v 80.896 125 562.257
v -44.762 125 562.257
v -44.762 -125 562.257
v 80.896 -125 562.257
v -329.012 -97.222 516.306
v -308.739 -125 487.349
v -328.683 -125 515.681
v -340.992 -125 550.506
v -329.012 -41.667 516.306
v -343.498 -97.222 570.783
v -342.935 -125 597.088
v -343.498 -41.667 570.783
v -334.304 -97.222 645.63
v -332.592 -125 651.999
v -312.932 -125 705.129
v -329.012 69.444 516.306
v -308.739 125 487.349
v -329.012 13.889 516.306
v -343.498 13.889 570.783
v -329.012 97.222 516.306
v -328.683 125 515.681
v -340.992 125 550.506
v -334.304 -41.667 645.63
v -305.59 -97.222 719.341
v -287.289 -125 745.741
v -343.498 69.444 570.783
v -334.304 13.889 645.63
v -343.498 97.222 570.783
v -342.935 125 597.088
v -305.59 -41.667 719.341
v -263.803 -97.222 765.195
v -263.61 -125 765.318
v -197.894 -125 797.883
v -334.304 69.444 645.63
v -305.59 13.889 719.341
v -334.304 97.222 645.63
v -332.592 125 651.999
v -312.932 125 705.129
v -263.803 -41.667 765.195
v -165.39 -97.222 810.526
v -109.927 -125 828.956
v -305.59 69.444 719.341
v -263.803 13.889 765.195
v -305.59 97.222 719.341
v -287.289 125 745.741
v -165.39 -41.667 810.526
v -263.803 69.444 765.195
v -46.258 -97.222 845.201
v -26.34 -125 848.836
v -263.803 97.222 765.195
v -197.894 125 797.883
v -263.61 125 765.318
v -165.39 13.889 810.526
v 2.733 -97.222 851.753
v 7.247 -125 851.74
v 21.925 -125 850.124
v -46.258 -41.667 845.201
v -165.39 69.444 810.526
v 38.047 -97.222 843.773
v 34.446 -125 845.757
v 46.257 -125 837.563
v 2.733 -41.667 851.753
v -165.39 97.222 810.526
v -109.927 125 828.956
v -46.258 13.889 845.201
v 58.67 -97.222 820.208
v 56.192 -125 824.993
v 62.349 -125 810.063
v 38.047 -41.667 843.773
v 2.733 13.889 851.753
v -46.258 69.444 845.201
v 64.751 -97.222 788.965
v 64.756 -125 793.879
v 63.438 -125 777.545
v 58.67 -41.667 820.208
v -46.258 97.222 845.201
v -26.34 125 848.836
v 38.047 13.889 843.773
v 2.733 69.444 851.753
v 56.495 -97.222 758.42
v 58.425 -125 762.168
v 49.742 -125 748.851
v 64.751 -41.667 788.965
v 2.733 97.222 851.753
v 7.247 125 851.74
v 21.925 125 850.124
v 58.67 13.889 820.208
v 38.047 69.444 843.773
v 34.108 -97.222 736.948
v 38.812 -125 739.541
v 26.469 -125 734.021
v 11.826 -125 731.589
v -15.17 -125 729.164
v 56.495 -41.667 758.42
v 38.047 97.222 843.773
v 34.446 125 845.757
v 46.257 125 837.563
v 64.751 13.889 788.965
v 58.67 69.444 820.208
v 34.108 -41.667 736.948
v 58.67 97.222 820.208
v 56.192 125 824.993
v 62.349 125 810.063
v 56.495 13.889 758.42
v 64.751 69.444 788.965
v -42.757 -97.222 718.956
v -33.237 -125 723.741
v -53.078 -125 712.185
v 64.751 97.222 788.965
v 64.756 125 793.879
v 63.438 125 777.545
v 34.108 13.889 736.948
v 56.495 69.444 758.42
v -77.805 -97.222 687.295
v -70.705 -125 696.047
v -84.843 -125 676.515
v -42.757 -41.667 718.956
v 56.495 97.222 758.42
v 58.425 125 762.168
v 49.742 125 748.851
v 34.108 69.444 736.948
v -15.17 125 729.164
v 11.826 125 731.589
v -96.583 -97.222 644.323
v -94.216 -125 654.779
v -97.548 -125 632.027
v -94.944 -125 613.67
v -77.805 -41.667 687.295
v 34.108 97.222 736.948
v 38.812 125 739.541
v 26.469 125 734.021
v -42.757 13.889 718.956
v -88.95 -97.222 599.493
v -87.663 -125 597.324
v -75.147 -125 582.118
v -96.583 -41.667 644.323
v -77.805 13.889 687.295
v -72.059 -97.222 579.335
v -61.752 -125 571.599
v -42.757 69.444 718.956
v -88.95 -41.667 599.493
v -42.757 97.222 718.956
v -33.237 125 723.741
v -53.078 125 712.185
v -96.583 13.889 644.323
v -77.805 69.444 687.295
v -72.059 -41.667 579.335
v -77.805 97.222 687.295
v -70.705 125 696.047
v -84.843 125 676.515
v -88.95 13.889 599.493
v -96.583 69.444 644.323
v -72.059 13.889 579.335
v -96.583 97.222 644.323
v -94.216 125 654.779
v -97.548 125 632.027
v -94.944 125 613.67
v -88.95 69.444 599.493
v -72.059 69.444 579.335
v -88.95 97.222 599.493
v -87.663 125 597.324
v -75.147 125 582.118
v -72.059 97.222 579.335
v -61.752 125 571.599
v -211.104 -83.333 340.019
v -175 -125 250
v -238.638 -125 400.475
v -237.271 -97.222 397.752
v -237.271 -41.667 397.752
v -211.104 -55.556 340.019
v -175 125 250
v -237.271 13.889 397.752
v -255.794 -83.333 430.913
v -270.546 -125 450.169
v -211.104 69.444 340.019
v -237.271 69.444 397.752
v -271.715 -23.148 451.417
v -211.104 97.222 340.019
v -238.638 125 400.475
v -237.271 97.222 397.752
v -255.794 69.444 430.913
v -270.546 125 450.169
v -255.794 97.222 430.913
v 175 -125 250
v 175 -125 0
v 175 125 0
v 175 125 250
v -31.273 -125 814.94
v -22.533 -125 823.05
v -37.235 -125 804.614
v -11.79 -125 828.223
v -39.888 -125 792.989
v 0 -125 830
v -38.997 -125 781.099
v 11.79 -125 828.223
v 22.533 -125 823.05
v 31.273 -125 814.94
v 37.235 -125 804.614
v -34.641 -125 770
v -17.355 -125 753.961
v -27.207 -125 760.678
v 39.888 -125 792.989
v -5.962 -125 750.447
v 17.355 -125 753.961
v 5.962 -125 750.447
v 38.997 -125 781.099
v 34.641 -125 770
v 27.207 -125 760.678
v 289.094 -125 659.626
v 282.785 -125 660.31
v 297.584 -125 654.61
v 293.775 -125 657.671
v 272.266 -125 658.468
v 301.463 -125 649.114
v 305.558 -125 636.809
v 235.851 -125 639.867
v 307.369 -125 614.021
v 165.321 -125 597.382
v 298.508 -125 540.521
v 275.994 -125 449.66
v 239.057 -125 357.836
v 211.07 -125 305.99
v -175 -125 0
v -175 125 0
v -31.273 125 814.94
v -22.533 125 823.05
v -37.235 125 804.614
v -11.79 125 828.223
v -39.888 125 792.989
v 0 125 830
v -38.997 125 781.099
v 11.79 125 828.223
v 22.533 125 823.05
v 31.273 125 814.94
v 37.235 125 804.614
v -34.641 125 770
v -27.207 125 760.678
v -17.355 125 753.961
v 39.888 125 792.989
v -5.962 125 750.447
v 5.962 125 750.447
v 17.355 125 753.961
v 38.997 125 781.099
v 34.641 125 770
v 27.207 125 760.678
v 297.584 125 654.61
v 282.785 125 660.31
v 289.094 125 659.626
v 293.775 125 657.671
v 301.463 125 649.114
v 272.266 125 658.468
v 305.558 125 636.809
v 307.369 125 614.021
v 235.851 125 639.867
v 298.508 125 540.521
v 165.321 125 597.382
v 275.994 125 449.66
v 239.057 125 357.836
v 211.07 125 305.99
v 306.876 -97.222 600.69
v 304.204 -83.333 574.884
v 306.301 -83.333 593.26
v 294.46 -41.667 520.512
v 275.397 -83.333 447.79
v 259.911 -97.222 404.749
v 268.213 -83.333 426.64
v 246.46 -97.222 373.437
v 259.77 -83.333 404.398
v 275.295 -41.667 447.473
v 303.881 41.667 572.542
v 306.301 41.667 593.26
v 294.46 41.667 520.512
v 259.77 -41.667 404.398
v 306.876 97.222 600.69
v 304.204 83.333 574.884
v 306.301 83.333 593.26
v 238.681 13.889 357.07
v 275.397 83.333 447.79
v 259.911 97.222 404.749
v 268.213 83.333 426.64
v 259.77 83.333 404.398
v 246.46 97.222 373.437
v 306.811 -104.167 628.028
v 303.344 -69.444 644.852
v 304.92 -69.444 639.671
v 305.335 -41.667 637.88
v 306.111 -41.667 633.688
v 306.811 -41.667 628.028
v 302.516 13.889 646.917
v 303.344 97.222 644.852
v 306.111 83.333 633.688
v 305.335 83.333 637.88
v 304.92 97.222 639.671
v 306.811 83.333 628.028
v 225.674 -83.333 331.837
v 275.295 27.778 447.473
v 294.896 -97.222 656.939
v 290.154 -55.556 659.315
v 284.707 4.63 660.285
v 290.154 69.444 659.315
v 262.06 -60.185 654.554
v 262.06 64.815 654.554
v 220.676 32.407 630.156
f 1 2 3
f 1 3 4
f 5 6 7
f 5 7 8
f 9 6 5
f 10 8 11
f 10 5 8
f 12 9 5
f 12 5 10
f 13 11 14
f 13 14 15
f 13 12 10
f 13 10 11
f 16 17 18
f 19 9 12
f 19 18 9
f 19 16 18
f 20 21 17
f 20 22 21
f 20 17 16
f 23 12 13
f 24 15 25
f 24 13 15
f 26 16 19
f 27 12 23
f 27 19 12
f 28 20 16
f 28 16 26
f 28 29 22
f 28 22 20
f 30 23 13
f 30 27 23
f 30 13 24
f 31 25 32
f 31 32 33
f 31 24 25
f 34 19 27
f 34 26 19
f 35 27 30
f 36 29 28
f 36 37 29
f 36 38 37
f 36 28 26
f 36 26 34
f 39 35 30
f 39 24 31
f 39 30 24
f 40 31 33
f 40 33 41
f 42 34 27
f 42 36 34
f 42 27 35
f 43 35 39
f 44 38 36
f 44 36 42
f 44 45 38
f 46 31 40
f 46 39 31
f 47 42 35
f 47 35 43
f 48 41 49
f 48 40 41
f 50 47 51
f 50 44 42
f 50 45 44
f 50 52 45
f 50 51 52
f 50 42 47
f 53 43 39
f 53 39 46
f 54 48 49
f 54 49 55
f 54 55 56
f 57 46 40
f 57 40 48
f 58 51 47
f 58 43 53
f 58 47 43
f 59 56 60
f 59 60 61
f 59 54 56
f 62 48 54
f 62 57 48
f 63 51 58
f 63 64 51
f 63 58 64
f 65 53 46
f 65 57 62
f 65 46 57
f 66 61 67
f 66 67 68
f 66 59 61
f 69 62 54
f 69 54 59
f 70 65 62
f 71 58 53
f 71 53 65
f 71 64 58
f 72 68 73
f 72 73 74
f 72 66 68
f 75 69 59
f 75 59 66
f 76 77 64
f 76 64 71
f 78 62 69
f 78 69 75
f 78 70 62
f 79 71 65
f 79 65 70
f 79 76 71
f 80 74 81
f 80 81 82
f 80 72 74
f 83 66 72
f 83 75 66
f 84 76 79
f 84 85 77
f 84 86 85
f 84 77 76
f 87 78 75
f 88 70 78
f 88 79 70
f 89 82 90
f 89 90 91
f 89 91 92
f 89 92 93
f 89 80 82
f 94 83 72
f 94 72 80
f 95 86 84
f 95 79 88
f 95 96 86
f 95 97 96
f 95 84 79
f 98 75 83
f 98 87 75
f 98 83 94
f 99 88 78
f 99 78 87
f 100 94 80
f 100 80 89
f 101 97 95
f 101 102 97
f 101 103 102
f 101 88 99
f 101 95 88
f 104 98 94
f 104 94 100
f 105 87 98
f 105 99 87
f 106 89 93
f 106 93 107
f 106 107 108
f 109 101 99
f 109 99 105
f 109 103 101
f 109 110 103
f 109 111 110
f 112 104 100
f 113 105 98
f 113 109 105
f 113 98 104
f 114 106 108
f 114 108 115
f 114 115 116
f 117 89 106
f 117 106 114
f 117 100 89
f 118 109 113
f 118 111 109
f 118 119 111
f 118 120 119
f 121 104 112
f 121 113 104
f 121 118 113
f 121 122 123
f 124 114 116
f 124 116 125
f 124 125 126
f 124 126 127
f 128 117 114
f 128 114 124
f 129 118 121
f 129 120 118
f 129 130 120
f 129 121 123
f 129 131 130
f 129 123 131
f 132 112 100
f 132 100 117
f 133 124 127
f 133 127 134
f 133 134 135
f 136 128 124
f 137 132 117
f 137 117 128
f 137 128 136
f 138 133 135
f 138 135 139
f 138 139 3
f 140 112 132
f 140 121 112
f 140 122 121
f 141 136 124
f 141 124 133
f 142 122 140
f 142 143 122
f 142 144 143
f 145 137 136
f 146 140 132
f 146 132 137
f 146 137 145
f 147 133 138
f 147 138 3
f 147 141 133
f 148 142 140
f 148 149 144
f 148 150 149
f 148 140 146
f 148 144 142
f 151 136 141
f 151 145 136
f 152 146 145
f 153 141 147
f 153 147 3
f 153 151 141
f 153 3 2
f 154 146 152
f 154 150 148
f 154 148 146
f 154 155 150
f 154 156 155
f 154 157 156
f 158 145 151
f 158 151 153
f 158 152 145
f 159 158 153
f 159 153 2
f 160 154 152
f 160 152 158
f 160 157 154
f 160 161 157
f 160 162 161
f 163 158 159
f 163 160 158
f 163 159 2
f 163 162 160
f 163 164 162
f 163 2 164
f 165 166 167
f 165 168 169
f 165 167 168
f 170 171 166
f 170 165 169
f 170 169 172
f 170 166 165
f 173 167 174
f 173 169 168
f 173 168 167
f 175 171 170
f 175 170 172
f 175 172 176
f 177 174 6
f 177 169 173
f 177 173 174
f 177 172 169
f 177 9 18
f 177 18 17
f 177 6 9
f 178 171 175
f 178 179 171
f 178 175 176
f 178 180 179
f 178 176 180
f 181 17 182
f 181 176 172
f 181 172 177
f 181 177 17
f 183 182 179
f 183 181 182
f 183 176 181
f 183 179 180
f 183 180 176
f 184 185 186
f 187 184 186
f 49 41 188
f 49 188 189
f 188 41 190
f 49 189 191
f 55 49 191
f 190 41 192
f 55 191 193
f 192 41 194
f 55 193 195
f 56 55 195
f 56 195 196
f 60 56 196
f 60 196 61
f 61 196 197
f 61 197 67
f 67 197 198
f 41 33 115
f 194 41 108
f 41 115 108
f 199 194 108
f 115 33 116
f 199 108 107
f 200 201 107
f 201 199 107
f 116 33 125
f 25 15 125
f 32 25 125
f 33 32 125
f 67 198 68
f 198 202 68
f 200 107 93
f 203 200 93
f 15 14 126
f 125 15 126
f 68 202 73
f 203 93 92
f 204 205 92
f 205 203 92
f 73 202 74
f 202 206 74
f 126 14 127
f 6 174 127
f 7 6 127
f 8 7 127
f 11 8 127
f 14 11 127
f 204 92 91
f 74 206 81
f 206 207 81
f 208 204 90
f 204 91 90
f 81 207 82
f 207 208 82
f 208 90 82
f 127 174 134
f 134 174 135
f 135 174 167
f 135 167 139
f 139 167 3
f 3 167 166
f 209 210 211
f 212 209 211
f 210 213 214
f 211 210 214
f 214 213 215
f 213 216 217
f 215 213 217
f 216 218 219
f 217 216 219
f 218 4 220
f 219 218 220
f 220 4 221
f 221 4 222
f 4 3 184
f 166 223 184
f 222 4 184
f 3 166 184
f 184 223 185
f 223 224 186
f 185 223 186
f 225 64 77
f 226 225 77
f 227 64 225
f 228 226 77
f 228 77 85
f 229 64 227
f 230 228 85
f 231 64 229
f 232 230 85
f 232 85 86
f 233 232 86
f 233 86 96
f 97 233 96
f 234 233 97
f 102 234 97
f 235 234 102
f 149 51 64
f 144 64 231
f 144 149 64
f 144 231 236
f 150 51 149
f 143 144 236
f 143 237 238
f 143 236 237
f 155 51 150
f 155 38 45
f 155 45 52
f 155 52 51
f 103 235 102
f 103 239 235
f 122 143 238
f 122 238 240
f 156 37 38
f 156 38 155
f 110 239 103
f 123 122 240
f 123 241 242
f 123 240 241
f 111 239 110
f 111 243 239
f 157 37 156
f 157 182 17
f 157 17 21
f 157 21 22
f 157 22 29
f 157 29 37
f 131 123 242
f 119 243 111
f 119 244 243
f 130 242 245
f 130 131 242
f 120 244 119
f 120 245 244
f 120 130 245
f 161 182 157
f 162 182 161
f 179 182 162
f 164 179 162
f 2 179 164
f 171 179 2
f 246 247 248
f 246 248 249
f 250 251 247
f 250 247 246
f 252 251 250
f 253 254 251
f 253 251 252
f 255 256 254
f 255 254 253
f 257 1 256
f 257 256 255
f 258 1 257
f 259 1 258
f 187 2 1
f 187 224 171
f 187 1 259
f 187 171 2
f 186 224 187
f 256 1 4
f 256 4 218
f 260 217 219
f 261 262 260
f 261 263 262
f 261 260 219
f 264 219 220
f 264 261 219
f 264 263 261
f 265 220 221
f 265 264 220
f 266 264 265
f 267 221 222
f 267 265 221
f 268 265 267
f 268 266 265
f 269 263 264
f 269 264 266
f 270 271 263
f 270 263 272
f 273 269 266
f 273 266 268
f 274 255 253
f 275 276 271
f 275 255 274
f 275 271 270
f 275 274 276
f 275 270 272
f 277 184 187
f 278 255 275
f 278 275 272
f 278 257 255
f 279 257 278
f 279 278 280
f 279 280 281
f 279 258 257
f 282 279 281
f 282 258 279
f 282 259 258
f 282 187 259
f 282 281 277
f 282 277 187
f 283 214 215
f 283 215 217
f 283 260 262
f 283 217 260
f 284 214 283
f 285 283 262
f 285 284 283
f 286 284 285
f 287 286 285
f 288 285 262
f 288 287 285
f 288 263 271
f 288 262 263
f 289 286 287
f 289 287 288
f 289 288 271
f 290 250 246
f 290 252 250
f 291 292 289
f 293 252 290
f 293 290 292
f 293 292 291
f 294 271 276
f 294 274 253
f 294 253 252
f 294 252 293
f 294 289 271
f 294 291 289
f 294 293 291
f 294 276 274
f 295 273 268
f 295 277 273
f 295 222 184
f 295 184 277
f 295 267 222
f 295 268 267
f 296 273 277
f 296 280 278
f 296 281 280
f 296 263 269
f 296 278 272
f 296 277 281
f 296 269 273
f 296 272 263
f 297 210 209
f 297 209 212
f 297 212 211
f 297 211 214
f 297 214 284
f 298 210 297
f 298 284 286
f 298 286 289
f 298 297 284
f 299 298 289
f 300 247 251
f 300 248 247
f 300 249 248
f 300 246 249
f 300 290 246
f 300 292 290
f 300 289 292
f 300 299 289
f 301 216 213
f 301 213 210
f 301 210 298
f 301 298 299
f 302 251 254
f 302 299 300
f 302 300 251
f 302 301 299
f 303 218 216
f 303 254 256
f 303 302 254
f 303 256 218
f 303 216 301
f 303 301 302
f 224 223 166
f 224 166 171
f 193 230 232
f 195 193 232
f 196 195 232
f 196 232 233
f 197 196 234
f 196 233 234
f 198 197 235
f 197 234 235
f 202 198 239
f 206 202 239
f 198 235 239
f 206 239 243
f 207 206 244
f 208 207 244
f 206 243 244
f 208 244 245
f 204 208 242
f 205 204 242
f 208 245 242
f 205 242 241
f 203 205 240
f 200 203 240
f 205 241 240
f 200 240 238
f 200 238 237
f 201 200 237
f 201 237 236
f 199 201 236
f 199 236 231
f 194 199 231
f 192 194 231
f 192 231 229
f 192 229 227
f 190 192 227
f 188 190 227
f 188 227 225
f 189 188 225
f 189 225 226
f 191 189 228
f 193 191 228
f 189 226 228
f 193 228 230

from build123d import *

# Parameters (mm, degrees)
SKETCH1_W           = 350
SKETCH1_H           = 250
BOSS_EXTRUDE1_DEPTH = 250
SKETCH2_R           = 40
BOSS_EXTRUDE2_DEPTH = 250


with BuildPart() as part:
    # Sketch1 → Boss-Extrude1 (new body)
    with BuildSketch(Plane.XY):
        Rectangle(SKETCH1_W, SKETCH1_H)
    extrude(amount=BOSS_EXTRUDE1_DEPTH)

    # Sketch2 → Boss-Extrude2 (add)
    with BuildSketch(Plane(origin=(0, 125, 0), x_dir=(1, 0, 0), z_dir=(0, 1, 0))):
        with BuildLine():
            Line((-44.761719829, -562.257161455), (80.895640954, -562.257161455))
            add(Edge.make_bspline(
                [(80.895640954, -562.257161455), (172.431287344, -592.316314524), (262.314302804, -669.613832446), (342.133537357, -676.640646609), (255.419582957, -365.16993701), (175, -250)],
                knots=[0, 0, 0, 0, 0.370060598, 0.815514955, 1, 1, 1, 1], degree=3))
            Line((175, -250), (-175, -250))
            add(Edge.make_bspline(
                [(-175, -250), (-243.158689552, -426.743473279), (-279.701762469, -458.647578572), (-372.289259306, -544.030243143), (-313.337421002, -725.664643324), (-239.02768417, -788.31097063), (-69.766922721, -847.84154556), (79.82482521, -857.588069073), (77.530765346, -724.034365353), (-68.959663963, -737.752024236), (-144.32805007, -608.054833161), (-44.761719829, -562.257161455)],
                knots=[0, 0, 0, 0, 0.137379521, 0.290337808, 0.419114902, 0.452202059, 0.602430788, 0.64183151, 0.80680856, 0.844687623, 1, 1, 1, 1], degree=3))
        make_face()
        with Locations(Location((0, -790, 0), (0, 0, 270))):
            Circle(SKETCH2_R, mode=Mode.SUBTRACT)
    extrude(amount=-BOSS_EXTRUDE2_DEPTH)


solid = part.part
